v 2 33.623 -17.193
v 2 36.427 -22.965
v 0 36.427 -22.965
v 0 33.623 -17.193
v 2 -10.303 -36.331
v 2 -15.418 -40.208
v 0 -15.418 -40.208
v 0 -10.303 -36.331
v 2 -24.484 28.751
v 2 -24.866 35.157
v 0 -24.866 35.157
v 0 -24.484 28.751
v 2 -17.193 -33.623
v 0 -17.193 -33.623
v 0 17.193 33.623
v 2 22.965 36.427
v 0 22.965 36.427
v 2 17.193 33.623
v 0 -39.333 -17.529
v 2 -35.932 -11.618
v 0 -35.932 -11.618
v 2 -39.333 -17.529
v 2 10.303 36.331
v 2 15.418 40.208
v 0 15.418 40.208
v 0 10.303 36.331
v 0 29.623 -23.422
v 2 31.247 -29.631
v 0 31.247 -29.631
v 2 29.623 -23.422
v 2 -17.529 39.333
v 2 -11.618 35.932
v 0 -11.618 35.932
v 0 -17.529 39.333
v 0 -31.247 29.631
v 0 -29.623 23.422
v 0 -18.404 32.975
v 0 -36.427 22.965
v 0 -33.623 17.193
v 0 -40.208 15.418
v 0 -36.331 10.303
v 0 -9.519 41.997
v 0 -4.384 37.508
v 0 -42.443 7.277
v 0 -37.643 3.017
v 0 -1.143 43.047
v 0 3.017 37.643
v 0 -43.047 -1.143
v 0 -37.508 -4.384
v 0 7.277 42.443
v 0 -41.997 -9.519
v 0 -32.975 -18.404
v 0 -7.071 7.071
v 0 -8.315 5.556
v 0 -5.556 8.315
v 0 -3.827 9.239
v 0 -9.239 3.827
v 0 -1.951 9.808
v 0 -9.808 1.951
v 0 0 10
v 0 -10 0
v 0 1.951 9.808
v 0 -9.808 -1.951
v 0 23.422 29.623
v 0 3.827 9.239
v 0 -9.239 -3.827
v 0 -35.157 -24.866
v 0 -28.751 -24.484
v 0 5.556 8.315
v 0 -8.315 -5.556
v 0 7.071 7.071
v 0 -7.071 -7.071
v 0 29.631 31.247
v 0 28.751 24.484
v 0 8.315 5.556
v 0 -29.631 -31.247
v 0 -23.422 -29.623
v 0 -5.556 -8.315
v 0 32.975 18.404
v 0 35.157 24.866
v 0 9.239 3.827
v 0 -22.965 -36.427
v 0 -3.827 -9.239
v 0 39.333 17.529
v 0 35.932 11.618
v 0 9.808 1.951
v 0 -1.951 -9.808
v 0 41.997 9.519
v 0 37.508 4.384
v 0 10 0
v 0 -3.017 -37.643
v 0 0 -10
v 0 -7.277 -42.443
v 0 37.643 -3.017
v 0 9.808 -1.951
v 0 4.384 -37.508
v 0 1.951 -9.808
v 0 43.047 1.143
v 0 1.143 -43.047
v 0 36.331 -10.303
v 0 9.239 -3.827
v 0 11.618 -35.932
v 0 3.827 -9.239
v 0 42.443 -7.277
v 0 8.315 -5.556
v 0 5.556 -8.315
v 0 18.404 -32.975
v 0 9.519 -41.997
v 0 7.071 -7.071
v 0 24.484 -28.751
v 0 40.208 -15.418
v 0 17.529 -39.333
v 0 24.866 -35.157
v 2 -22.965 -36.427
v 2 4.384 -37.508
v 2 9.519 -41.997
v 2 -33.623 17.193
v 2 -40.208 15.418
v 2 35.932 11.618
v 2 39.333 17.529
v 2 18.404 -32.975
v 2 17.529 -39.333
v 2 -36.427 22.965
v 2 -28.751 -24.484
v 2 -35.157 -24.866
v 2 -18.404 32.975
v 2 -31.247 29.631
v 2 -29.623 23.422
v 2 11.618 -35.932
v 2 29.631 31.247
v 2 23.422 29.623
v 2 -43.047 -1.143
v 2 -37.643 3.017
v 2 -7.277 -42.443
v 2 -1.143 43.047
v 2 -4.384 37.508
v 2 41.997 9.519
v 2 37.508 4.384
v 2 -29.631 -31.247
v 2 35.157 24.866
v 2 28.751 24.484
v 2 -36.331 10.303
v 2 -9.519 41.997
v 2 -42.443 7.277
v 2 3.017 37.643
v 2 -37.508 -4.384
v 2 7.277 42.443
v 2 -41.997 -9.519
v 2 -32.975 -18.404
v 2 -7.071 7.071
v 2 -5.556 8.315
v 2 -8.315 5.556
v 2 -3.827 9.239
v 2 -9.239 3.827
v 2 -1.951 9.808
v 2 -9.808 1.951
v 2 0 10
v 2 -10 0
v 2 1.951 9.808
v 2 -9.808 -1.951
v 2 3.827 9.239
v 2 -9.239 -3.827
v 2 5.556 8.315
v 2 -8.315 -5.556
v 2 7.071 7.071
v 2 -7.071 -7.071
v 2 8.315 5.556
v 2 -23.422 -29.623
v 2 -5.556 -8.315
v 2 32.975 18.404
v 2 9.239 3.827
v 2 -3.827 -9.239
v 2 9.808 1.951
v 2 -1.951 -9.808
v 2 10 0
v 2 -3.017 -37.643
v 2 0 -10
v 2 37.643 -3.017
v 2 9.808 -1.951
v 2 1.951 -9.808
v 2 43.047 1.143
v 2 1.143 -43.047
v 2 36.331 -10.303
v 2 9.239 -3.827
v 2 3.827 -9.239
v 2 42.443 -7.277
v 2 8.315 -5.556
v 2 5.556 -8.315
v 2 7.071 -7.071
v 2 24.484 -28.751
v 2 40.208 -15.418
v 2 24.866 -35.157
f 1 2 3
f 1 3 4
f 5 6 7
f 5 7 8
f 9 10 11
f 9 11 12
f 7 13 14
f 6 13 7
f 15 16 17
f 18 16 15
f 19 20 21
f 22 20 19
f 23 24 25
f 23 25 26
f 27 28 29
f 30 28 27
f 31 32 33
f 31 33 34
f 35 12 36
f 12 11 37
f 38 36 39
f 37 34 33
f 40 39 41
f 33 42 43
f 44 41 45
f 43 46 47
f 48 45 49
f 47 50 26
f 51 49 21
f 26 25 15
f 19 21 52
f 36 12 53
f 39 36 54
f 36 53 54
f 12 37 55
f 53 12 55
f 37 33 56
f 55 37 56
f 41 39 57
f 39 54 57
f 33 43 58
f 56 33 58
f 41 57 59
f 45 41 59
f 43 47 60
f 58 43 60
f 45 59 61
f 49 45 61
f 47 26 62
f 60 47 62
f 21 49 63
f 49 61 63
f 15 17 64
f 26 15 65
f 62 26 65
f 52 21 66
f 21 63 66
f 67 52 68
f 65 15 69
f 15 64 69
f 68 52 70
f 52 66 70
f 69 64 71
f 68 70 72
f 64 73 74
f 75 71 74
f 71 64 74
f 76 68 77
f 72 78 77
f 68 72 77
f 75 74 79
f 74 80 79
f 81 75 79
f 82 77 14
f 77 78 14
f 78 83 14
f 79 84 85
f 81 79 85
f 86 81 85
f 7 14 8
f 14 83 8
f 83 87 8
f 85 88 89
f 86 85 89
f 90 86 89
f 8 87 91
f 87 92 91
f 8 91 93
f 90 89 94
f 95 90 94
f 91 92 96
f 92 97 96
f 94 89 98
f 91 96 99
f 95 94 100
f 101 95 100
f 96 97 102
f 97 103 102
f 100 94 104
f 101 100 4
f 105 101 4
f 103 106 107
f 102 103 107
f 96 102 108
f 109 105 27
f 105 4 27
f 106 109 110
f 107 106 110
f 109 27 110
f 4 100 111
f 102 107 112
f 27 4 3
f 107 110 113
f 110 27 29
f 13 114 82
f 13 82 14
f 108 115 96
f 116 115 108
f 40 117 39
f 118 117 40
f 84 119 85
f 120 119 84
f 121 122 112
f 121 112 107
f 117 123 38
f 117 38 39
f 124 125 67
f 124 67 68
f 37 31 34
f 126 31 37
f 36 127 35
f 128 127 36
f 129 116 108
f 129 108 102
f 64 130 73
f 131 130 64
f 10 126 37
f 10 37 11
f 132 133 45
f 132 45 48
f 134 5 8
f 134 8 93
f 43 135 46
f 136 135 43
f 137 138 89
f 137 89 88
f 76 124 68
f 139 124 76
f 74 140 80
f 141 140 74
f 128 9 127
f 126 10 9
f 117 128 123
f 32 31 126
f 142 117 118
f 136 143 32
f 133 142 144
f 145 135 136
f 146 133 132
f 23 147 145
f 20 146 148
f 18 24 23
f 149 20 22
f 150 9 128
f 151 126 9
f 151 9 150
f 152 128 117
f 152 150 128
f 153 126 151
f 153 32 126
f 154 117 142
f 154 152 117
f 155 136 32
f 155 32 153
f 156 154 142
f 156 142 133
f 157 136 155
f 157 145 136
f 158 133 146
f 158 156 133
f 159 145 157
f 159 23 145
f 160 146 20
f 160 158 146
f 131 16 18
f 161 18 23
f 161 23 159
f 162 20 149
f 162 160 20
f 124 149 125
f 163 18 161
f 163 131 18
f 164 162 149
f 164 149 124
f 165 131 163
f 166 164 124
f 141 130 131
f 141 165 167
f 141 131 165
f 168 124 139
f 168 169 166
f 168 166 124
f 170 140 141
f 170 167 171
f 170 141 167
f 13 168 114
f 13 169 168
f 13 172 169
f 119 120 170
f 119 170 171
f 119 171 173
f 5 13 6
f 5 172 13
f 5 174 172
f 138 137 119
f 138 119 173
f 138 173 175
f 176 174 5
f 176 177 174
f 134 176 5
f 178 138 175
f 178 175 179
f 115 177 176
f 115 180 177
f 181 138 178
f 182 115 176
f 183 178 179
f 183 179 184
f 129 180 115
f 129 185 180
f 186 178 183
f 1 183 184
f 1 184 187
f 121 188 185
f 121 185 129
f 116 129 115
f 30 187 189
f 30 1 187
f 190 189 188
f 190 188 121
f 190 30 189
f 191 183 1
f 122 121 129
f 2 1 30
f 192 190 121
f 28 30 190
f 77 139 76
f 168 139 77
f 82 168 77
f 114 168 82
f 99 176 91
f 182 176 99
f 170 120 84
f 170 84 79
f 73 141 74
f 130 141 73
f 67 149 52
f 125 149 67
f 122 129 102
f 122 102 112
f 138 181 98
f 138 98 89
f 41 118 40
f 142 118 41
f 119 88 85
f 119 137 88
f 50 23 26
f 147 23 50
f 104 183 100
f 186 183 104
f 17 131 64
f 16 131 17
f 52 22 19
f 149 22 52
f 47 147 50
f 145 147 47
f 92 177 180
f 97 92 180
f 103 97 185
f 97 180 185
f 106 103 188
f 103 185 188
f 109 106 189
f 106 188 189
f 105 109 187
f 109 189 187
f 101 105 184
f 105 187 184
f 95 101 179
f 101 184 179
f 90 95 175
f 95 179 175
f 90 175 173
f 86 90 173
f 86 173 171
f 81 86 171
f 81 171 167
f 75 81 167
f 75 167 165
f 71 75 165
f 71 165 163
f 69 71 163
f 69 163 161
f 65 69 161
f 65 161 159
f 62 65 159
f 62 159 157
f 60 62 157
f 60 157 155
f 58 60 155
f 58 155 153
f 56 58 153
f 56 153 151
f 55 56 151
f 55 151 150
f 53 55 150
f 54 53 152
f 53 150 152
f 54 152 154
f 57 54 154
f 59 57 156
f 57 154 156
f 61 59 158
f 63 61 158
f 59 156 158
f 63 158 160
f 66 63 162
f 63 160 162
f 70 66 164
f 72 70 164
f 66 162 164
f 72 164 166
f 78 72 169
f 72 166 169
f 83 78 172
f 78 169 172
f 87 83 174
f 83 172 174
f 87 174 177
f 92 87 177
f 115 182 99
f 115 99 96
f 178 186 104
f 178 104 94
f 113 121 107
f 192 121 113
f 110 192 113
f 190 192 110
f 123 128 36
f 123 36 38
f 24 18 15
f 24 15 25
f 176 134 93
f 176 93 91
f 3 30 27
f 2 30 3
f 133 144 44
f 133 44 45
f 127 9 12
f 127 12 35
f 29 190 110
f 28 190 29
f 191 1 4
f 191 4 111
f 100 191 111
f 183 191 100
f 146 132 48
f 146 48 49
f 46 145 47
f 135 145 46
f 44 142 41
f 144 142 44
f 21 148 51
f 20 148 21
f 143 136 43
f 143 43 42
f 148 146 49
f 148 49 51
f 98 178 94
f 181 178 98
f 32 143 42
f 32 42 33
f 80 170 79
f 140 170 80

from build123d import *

# Parameters (mm, degrees)
SKETCH1_R           = 45
BOSS_EXTRUDE1_DEPTH = 2
CUT_EXTRUDE2_DEPTH  = 64.671029519
CIRPATTERN1_COUNT   = 32
SKETCH4_R           = 10
CUT_EXTRUDE3_DEPTH  = 10


with BuildPart() as part:
    # Sketch1 → Boss-Extrude1 (new body)
    with BuildSketch(Plane(origin=(0, 0, 0), x_dir=(0, 0, -1), z_dir=(1, 0, 0))):
        Circle(SKETCH1_R)
    extrude(amount=BOSS_EXTRUDE1_DEPTH)

    # Sketch3 → Cut-Extrude2 (cut, symmetric)
    with BuildSketch(Plane(origin=(2, 0, 0), x_dir=(0, 0, -1), z_dir=(1, 0, 0))):
        Polygon((111.061055433, 234.770812069), (0, 45), (-4.384441822, 37.508273204), (-11.303681047, 43.557166974), (-176.845255951, 188.275880779), (-246.955404965, 622.412545429), (40.950906418, 668.907476719), align=None)
    cut_extrude2 = extrude(amount=CUT_EXTRUDE2_DEPTH, both=True, mode=Mode.SUBTRACT)

    # CirPattern1: Cut-Extrude2 ×32 about axis
    cirpattern1_axis = Axis((2, 0, 0), (-1, 0, 0))
    for i in range(1, CIRPATTERN1_COUNT):
        add(cut_extrude2.rotate(cirpattern1_axis, i * 360 / CIRPATTERN1_COUNT), mode=Mode.SUBTRACT)

    # Sketch4 → Cut-Extrude3 (cut)
    with BuildSketch(Plane(origin=(2, 0, 0), x_dir=(0, 0, -1), z_dir=(1, 0, 0))):
        Circle(SKETCH4_R)
    extrude(amount=-CUT_EXTRUDE3_DEPTH, mode=Mode.SUBTRACT)


solid = part.part
